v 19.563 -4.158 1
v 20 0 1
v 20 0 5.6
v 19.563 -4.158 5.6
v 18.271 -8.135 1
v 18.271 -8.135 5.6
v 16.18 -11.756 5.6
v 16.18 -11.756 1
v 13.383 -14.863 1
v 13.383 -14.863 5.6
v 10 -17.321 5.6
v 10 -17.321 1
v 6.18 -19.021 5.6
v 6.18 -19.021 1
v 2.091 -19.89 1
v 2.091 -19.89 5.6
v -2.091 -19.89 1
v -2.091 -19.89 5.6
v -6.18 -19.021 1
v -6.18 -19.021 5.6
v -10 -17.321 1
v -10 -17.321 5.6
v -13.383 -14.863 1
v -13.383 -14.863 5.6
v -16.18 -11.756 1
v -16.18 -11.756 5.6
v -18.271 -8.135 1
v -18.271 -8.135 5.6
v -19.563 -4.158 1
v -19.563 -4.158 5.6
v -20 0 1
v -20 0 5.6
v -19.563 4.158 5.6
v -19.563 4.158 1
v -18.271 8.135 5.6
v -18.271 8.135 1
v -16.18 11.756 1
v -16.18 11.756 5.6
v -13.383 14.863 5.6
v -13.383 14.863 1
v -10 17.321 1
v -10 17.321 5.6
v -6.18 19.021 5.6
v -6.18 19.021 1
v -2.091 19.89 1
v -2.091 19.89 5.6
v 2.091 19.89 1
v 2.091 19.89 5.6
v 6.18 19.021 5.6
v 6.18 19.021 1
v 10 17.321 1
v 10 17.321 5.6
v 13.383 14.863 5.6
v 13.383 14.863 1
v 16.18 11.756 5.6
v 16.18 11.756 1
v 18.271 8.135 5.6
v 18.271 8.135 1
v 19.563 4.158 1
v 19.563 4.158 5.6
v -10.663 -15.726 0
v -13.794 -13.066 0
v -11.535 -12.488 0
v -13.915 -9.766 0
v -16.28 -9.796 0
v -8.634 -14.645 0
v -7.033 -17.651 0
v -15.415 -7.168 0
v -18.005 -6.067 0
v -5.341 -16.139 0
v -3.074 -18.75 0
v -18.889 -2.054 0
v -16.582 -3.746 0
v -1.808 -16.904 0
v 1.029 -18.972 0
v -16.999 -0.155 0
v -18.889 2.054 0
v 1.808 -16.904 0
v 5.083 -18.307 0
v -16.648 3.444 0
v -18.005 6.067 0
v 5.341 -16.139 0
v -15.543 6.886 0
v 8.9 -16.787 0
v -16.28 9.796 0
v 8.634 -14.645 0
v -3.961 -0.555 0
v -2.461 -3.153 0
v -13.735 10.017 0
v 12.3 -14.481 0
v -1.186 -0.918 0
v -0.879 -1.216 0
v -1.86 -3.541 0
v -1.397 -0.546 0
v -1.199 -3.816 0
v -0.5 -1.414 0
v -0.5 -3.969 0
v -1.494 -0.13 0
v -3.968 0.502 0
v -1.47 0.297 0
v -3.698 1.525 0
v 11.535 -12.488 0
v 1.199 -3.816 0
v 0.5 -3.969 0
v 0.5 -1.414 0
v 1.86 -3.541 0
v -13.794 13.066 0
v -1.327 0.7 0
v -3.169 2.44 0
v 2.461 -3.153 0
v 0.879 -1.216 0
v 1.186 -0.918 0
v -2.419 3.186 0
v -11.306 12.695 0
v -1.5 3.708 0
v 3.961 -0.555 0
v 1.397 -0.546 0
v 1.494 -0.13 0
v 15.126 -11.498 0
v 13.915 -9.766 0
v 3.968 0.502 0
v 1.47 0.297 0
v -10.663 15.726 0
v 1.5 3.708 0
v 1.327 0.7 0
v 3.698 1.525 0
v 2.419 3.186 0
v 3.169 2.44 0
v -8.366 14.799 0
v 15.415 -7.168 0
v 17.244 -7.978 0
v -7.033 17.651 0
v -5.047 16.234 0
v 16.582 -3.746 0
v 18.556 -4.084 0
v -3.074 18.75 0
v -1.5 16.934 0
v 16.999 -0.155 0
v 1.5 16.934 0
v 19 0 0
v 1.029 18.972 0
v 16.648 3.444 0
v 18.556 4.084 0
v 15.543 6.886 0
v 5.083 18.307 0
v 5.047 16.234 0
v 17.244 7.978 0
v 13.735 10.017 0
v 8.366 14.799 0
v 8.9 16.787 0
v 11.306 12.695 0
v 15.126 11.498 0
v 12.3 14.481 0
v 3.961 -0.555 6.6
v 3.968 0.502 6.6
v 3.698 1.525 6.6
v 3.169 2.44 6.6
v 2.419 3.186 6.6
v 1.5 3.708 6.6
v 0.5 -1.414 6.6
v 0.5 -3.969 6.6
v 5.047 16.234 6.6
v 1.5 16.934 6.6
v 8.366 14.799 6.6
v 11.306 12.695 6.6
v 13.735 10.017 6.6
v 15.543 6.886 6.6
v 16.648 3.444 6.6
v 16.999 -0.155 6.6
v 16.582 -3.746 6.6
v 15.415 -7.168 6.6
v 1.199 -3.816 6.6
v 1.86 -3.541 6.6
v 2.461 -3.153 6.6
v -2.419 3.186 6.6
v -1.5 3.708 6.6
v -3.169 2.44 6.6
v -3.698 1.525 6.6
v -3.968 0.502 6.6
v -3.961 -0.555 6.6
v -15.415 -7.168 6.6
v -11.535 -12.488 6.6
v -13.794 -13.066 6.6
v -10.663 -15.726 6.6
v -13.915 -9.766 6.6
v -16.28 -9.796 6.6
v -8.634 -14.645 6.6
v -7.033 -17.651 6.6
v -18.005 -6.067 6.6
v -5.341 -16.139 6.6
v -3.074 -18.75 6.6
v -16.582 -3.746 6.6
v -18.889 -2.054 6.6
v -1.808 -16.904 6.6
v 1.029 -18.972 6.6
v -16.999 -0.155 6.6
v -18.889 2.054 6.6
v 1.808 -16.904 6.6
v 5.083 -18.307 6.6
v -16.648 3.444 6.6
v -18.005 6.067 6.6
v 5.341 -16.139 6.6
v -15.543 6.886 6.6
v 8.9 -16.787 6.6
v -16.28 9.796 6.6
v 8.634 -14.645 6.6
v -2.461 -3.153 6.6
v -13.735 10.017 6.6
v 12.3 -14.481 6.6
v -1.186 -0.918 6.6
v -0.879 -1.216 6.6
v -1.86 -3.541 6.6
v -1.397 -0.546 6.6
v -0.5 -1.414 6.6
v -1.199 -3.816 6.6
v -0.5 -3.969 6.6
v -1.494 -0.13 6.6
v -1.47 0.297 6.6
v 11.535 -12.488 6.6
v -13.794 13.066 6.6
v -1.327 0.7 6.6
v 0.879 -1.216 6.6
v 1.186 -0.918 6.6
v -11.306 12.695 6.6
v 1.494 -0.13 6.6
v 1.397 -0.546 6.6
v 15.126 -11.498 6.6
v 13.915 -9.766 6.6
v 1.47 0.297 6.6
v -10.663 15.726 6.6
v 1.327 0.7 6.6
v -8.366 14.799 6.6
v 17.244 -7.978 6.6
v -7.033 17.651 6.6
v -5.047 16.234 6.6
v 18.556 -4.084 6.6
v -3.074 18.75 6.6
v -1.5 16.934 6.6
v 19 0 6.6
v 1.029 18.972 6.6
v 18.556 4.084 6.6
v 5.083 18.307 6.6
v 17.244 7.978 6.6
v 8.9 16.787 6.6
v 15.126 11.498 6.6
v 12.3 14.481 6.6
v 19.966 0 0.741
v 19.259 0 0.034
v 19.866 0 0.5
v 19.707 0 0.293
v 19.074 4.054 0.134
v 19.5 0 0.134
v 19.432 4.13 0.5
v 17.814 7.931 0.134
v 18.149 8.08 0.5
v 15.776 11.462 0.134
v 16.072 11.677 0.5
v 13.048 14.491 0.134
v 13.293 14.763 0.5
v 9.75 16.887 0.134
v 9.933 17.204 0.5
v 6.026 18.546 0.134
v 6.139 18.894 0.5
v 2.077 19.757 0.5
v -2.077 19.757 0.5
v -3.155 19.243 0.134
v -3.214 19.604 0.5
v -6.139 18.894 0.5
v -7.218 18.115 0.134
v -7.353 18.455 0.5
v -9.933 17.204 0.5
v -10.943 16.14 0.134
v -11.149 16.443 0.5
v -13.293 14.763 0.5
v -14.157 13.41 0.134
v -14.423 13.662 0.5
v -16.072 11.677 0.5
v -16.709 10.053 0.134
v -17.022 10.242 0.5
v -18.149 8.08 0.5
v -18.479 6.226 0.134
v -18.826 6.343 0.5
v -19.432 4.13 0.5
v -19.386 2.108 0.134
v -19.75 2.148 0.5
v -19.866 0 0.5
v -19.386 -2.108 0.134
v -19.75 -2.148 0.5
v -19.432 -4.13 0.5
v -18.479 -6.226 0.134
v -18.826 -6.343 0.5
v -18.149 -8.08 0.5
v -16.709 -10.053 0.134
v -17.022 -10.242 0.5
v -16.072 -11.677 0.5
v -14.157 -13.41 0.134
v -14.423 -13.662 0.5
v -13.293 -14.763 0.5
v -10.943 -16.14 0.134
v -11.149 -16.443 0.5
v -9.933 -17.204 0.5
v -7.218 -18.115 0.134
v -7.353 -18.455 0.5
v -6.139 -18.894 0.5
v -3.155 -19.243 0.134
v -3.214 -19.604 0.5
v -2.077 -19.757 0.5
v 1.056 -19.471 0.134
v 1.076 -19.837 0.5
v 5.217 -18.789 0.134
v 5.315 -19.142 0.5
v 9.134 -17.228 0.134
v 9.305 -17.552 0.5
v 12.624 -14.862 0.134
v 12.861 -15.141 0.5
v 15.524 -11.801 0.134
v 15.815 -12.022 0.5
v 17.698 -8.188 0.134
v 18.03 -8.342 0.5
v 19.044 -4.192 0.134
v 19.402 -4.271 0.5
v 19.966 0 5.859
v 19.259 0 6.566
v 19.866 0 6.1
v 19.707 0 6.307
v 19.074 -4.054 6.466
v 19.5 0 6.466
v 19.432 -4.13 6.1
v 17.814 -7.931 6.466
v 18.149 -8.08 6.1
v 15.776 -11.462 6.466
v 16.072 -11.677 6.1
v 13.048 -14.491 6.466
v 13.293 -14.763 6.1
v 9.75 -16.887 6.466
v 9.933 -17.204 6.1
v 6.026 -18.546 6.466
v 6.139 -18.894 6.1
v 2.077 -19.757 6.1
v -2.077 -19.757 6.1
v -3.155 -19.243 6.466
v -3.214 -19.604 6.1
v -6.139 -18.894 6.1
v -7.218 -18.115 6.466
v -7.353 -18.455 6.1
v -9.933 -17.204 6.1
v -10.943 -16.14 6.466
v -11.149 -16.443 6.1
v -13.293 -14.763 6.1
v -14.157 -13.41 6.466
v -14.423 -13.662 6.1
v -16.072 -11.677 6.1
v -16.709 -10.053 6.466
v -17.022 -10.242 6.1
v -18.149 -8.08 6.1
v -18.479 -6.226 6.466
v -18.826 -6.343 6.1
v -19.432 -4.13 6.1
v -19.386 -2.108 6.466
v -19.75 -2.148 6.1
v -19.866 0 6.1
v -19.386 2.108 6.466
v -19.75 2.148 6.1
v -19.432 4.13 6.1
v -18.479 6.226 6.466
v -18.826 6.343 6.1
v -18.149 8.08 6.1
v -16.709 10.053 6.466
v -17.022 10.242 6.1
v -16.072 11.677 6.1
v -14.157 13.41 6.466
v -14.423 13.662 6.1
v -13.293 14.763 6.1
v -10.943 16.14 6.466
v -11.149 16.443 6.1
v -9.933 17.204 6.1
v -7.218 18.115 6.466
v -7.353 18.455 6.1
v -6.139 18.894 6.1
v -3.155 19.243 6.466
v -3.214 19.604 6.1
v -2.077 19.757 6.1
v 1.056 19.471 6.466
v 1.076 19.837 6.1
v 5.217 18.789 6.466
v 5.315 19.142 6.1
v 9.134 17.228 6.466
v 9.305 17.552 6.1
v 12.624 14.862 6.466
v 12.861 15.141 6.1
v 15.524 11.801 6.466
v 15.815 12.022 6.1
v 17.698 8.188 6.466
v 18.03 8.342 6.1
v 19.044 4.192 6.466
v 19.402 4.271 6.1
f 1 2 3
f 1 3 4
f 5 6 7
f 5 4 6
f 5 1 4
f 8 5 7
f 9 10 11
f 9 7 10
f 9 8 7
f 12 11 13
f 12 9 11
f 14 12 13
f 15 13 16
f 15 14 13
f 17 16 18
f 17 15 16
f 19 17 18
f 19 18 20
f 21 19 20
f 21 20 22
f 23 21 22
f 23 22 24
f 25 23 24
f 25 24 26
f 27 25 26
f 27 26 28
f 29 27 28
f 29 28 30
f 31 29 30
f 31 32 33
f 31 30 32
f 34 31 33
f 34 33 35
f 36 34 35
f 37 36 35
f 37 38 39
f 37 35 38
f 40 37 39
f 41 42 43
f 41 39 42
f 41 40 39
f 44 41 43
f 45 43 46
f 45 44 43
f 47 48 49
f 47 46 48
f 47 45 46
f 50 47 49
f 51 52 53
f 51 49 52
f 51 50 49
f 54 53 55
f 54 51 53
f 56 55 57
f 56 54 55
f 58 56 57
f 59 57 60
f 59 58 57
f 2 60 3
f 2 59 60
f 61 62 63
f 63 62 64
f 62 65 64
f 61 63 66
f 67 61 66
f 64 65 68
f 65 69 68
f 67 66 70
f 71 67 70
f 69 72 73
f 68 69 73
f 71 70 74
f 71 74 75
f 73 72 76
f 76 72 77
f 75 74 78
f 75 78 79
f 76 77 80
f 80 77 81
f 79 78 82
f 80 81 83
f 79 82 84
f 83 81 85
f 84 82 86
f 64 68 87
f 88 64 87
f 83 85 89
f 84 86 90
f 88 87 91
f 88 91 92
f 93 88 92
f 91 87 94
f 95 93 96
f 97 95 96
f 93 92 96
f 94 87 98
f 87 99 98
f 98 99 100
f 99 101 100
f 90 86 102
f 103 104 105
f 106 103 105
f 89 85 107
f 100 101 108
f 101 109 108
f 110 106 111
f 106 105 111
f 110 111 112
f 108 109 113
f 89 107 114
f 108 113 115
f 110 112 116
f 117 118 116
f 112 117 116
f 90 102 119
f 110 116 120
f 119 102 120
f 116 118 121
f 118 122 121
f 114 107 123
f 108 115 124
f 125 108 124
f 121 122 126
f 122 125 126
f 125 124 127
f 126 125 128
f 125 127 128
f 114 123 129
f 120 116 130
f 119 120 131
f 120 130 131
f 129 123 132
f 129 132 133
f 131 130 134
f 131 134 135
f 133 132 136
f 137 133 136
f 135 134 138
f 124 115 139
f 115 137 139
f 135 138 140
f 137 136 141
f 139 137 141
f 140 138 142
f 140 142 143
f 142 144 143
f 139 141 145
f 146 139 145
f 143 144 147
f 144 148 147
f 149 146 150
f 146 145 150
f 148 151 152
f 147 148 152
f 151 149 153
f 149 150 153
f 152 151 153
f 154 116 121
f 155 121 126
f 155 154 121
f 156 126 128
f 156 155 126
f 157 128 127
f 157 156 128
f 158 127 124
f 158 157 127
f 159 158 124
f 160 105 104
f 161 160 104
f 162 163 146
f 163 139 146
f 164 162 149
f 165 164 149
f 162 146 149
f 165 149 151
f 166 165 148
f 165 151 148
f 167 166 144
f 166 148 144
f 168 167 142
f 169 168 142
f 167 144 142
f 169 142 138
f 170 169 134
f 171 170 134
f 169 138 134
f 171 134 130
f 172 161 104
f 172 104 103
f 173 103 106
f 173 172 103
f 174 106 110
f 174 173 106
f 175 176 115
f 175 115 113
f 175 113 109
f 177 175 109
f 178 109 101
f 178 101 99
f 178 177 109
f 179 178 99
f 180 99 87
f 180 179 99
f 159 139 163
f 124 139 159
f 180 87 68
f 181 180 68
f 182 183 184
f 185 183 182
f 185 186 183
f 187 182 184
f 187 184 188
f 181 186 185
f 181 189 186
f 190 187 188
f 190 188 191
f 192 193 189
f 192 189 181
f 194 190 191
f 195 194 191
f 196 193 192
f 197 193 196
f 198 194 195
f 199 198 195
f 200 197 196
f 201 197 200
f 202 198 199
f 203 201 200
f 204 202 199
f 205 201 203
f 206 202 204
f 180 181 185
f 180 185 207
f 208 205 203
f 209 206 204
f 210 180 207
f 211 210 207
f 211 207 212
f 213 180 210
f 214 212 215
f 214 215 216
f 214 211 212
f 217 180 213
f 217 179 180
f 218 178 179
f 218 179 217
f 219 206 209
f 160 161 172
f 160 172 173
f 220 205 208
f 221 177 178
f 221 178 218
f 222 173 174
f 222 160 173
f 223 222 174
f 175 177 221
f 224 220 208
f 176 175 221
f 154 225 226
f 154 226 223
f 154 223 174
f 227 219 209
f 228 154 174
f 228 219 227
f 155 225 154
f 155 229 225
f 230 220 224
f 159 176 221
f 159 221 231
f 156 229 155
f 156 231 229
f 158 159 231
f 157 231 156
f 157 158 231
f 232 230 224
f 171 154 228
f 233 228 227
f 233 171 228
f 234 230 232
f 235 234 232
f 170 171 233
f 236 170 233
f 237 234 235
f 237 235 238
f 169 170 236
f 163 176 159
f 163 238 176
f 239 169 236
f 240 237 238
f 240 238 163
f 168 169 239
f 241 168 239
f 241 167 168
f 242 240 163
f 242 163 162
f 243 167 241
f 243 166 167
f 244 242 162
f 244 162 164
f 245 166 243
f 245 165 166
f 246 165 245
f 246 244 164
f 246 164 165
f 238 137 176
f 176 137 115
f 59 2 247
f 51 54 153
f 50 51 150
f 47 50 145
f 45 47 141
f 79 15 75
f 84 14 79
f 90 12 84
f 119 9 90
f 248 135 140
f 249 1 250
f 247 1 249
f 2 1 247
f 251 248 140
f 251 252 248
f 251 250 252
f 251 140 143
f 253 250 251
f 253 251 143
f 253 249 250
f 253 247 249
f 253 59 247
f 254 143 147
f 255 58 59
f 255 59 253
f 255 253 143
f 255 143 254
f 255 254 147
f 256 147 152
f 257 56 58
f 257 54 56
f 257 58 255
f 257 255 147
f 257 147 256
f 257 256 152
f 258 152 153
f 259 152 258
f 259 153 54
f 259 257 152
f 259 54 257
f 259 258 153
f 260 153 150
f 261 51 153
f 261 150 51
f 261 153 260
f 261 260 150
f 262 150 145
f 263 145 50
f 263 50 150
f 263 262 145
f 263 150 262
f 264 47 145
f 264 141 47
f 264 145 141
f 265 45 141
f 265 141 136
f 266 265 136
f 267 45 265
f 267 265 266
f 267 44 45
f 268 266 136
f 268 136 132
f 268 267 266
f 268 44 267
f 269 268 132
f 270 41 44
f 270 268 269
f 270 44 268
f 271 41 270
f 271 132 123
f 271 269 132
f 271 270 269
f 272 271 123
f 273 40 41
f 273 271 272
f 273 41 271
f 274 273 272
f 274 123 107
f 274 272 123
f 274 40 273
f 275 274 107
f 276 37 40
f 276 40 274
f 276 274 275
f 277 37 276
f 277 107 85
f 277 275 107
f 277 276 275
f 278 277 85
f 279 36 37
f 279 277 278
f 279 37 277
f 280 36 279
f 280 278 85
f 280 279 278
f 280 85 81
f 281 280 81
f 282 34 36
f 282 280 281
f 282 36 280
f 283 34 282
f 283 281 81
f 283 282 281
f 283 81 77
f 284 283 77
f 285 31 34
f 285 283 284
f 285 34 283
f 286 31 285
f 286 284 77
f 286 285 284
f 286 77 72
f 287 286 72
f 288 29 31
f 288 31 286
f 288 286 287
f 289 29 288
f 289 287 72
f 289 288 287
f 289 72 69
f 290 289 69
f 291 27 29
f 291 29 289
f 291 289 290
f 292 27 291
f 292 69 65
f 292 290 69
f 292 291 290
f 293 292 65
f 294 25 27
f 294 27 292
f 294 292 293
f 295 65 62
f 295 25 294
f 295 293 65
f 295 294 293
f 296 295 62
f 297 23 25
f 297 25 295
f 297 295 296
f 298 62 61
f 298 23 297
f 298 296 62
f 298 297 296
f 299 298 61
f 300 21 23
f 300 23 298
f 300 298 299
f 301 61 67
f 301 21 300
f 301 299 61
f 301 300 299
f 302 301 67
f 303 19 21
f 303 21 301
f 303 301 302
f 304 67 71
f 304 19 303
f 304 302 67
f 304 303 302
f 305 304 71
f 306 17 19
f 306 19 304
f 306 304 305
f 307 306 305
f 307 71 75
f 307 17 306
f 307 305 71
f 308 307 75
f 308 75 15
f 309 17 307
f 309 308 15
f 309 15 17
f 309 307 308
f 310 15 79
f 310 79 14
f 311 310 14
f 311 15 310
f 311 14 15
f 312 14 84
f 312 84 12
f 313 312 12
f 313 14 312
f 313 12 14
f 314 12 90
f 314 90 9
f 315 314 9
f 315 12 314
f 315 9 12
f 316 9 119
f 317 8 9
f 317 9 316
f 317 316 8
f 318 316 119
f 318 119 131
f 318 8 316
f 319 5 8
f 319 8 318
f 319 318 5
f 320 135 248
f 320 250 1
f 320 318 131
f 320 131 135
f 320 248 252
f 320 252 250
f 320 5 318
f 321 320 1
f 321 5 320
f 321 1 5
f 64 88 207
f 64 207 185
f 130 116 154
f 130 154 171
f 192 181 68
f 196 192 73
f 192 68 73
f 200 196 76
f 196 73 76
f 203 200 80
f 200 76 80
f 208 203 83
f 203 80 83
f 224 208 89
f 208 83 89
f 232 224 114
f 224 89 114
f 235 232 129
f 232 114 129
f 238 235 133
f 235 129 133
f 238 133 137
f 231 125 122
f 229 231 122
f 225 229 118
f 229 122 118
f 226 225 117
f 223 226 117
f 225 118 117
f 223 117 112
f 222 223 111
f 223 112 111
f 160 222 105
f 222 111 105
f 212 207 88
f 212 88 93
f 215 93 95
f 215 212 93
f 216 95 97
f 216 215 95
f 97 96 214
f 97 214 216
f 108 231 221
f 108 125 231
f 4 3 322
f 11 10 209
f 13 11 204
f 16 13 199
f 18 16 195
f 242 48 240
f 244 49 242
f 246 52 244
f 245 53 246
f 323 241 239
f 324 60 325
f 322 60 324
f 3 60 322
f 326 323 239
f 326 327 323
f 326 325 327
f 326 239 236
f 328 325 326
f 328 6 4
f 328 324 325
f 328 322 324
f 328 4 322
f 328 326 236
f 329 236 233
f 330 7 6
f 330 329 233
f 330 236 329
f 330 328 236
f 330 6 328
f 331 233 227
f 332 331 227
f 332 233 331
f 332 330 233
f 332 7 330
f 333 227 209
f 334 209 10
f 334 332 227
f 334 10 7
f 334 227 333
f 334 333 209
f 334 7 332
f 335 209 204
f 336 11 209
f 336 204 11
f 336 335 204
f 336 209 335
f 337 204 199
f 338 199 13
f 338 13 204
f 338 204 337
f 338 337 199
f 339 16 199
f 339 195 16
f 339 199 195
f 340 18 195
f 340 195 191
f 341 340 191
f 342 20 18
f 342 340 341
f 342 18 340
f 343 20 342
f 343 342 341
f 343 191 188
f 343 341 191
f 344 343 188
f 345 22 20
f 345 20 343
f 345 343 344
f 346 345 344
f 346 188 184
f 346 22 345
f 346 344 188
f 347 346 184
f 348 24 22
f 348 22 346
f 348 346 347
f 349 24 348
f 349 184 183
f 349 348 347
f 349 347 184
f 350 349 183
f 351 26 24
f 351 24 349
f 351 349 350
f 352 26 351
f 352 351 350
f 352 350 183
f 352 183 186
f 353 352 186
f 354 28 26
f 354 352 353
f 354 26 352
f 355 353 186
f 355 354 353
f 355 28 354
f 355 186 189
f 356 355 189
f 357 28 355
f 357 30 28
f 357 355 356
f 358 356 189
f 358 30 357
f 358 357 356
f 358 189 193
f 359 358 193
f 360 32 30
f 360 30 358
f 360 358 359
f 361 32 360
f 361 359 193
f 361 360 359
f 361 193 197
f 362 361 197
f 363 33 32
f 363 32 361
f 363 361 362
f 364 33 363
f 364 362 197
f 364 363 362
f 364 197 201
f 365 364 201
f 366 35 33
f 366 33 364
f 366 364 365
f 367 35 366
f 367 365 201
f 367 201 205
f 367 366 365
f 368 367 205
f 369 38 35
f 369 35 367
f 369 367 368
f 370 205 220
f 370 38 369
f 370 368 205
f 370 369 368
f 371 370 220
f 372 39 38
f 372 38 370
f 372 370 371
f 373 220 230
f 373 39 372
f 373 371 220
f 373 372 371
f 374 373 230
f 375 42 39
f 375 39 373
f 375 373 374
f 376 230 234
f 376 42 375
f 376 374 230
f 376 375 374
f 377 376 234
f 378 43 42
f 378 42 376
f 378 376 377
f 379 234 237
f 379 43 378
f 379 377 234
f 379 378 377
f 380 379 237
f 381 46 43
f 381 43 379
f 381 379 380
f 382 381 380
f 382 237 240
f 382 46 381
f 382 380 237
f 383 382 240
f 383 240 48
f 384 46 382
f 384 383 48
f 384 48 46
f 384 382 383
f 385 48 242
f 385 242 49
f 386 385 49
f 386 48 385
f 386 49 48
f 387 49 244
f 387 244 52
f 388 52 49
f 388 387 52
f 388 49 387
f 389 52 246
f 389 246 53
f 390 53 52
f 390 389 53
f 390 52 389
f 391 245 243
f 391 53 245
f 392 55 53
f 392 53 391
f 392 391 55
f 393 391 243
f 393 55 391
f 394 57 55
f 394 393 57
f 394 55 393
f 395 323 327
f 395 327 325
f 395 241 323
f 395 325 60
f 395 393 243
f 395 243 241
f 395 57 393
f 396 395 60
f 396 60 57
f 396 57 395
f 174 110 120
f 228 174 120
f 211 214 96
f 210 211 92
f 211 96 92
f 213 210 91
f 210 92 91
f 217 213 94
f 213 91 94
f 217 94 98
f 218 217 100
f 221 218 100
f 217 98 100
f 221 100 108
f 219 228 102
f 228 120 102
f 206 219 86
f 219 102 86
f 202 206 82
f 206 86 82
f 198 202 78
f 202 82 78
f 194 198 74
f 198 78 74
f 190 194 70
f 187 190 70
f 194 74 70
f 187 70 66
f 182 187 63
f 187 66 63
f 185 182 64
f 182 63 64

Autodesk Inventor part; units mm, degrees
ref_plane "YZ Plane" through (0, 0, 0) normal (1, 0, 0) x (0, 1, 0)
ref_plane "XZ Plane" through (0, 0, 0) normal (0, 1, 0) x (-1, 0, 0)
ref_plane "XY Plane" through (0, 0, 0) normal (0, 0, 1) x (1, 0, 0)
sketch "Sketch1" plane through (0, 0, 0) normal (0, 0, 1) x (1, 0, 0)
  circle A0 centre (0, 0) radius 20
  dimension "d0" = 40
extrude "Extrusion1" add sketch "Sketch1" along normal blind 6.6
sketch "Sketch3" plane through (0, 0, 0) normal (0, 0, -1) x (-1, 0, 0)
  circle A0 centre (0, 0) radius 17
  line L0 (0, 17) -> (0, 0)
  line L1 (0, 0) -> (14.7224, -8.5)
  line L2 (0, 0) -> (-14.7224, -8.5)
  line L3 (0, 0) -> (17, 0) construction
  line L4 (1.5, 16.9337) -> (1.5, 0.866)
  line L5 (-1.5, 16.9337) -> (-1.5, 0.866)
  line L6 (-1.5, 0.866) -> (-15.415, -7.1678)
  line L7 (0, -1.7321) -> (-13.915, -9.7659)
  line L8 (1.5, 0.866) -> (15.415, -7.1678)
  line L9 (0, -1.7321) -> (13.915, -9.7659)
  dimension "d6" = 34
  dimension "d7" = 120
  dimension "d8" = 150
  dimension "d9" = 1.5
  dimension "d10" = 1.5
  dimension "d11" = 1.5
  dimension "d12" = 1.5
  dimension "d13" = 1.5
  dimension "d14" = 1.5
extrude "Extrusion3" cut sketch "Sketch3" against normal up to surface (6.6 mm away) contours A0 L8 L4 | L5 L6 A0 | A0 L7 L9
sketch "Sketch5" plane through (0, 0, 6.6) normal (0, 0, 1) x (1, 0, 0)
  circle A0 centre (0, 0) radius 4
  dimension "d20" = 8
extrude "Extrusion5" add sketch "Sketch5" against normal blind 6.6
sketch "Sketch6" plane through (0, 0, 0) normal (0, 0, -1) x (-1, 0, 0)
  circle A0 centre (0, 0) radius 1.5
  line L0 (0, -1.5) -> (0, -4)
  arc A1 (-2.4613, -3.1531) -> (2.4613, -3.1531) centre (0, 0) ccw projected
  line L1 (0.5, -1.4142) -> (0.5, -3.9686)
  line L2 (-0.5, -1.4142) -> (-0.5, -3.9686)
  line L3 (-1.3266, 0.7) -> (1.3266, 0.7)
  point P0 (0.0845, 0.7)
  dimension "d23" = 3
  dimension "d24" = 0.5
  dimension "d25" = 0.5
  dimension "d29" = 2.2
extrude "Extrusion6" cut sketch "Sketch6" against normal up to surface (6.6 mm away) contours A0 L3 | L1 A1 L0 A0 | L0 A1 L2 A0 picked at (0, -0.0333)
fillet "Arredondamento1" radius 1 2 edges at (-20, 0, 6.6) (-20, 0, 0)
properties part number "wheel"
